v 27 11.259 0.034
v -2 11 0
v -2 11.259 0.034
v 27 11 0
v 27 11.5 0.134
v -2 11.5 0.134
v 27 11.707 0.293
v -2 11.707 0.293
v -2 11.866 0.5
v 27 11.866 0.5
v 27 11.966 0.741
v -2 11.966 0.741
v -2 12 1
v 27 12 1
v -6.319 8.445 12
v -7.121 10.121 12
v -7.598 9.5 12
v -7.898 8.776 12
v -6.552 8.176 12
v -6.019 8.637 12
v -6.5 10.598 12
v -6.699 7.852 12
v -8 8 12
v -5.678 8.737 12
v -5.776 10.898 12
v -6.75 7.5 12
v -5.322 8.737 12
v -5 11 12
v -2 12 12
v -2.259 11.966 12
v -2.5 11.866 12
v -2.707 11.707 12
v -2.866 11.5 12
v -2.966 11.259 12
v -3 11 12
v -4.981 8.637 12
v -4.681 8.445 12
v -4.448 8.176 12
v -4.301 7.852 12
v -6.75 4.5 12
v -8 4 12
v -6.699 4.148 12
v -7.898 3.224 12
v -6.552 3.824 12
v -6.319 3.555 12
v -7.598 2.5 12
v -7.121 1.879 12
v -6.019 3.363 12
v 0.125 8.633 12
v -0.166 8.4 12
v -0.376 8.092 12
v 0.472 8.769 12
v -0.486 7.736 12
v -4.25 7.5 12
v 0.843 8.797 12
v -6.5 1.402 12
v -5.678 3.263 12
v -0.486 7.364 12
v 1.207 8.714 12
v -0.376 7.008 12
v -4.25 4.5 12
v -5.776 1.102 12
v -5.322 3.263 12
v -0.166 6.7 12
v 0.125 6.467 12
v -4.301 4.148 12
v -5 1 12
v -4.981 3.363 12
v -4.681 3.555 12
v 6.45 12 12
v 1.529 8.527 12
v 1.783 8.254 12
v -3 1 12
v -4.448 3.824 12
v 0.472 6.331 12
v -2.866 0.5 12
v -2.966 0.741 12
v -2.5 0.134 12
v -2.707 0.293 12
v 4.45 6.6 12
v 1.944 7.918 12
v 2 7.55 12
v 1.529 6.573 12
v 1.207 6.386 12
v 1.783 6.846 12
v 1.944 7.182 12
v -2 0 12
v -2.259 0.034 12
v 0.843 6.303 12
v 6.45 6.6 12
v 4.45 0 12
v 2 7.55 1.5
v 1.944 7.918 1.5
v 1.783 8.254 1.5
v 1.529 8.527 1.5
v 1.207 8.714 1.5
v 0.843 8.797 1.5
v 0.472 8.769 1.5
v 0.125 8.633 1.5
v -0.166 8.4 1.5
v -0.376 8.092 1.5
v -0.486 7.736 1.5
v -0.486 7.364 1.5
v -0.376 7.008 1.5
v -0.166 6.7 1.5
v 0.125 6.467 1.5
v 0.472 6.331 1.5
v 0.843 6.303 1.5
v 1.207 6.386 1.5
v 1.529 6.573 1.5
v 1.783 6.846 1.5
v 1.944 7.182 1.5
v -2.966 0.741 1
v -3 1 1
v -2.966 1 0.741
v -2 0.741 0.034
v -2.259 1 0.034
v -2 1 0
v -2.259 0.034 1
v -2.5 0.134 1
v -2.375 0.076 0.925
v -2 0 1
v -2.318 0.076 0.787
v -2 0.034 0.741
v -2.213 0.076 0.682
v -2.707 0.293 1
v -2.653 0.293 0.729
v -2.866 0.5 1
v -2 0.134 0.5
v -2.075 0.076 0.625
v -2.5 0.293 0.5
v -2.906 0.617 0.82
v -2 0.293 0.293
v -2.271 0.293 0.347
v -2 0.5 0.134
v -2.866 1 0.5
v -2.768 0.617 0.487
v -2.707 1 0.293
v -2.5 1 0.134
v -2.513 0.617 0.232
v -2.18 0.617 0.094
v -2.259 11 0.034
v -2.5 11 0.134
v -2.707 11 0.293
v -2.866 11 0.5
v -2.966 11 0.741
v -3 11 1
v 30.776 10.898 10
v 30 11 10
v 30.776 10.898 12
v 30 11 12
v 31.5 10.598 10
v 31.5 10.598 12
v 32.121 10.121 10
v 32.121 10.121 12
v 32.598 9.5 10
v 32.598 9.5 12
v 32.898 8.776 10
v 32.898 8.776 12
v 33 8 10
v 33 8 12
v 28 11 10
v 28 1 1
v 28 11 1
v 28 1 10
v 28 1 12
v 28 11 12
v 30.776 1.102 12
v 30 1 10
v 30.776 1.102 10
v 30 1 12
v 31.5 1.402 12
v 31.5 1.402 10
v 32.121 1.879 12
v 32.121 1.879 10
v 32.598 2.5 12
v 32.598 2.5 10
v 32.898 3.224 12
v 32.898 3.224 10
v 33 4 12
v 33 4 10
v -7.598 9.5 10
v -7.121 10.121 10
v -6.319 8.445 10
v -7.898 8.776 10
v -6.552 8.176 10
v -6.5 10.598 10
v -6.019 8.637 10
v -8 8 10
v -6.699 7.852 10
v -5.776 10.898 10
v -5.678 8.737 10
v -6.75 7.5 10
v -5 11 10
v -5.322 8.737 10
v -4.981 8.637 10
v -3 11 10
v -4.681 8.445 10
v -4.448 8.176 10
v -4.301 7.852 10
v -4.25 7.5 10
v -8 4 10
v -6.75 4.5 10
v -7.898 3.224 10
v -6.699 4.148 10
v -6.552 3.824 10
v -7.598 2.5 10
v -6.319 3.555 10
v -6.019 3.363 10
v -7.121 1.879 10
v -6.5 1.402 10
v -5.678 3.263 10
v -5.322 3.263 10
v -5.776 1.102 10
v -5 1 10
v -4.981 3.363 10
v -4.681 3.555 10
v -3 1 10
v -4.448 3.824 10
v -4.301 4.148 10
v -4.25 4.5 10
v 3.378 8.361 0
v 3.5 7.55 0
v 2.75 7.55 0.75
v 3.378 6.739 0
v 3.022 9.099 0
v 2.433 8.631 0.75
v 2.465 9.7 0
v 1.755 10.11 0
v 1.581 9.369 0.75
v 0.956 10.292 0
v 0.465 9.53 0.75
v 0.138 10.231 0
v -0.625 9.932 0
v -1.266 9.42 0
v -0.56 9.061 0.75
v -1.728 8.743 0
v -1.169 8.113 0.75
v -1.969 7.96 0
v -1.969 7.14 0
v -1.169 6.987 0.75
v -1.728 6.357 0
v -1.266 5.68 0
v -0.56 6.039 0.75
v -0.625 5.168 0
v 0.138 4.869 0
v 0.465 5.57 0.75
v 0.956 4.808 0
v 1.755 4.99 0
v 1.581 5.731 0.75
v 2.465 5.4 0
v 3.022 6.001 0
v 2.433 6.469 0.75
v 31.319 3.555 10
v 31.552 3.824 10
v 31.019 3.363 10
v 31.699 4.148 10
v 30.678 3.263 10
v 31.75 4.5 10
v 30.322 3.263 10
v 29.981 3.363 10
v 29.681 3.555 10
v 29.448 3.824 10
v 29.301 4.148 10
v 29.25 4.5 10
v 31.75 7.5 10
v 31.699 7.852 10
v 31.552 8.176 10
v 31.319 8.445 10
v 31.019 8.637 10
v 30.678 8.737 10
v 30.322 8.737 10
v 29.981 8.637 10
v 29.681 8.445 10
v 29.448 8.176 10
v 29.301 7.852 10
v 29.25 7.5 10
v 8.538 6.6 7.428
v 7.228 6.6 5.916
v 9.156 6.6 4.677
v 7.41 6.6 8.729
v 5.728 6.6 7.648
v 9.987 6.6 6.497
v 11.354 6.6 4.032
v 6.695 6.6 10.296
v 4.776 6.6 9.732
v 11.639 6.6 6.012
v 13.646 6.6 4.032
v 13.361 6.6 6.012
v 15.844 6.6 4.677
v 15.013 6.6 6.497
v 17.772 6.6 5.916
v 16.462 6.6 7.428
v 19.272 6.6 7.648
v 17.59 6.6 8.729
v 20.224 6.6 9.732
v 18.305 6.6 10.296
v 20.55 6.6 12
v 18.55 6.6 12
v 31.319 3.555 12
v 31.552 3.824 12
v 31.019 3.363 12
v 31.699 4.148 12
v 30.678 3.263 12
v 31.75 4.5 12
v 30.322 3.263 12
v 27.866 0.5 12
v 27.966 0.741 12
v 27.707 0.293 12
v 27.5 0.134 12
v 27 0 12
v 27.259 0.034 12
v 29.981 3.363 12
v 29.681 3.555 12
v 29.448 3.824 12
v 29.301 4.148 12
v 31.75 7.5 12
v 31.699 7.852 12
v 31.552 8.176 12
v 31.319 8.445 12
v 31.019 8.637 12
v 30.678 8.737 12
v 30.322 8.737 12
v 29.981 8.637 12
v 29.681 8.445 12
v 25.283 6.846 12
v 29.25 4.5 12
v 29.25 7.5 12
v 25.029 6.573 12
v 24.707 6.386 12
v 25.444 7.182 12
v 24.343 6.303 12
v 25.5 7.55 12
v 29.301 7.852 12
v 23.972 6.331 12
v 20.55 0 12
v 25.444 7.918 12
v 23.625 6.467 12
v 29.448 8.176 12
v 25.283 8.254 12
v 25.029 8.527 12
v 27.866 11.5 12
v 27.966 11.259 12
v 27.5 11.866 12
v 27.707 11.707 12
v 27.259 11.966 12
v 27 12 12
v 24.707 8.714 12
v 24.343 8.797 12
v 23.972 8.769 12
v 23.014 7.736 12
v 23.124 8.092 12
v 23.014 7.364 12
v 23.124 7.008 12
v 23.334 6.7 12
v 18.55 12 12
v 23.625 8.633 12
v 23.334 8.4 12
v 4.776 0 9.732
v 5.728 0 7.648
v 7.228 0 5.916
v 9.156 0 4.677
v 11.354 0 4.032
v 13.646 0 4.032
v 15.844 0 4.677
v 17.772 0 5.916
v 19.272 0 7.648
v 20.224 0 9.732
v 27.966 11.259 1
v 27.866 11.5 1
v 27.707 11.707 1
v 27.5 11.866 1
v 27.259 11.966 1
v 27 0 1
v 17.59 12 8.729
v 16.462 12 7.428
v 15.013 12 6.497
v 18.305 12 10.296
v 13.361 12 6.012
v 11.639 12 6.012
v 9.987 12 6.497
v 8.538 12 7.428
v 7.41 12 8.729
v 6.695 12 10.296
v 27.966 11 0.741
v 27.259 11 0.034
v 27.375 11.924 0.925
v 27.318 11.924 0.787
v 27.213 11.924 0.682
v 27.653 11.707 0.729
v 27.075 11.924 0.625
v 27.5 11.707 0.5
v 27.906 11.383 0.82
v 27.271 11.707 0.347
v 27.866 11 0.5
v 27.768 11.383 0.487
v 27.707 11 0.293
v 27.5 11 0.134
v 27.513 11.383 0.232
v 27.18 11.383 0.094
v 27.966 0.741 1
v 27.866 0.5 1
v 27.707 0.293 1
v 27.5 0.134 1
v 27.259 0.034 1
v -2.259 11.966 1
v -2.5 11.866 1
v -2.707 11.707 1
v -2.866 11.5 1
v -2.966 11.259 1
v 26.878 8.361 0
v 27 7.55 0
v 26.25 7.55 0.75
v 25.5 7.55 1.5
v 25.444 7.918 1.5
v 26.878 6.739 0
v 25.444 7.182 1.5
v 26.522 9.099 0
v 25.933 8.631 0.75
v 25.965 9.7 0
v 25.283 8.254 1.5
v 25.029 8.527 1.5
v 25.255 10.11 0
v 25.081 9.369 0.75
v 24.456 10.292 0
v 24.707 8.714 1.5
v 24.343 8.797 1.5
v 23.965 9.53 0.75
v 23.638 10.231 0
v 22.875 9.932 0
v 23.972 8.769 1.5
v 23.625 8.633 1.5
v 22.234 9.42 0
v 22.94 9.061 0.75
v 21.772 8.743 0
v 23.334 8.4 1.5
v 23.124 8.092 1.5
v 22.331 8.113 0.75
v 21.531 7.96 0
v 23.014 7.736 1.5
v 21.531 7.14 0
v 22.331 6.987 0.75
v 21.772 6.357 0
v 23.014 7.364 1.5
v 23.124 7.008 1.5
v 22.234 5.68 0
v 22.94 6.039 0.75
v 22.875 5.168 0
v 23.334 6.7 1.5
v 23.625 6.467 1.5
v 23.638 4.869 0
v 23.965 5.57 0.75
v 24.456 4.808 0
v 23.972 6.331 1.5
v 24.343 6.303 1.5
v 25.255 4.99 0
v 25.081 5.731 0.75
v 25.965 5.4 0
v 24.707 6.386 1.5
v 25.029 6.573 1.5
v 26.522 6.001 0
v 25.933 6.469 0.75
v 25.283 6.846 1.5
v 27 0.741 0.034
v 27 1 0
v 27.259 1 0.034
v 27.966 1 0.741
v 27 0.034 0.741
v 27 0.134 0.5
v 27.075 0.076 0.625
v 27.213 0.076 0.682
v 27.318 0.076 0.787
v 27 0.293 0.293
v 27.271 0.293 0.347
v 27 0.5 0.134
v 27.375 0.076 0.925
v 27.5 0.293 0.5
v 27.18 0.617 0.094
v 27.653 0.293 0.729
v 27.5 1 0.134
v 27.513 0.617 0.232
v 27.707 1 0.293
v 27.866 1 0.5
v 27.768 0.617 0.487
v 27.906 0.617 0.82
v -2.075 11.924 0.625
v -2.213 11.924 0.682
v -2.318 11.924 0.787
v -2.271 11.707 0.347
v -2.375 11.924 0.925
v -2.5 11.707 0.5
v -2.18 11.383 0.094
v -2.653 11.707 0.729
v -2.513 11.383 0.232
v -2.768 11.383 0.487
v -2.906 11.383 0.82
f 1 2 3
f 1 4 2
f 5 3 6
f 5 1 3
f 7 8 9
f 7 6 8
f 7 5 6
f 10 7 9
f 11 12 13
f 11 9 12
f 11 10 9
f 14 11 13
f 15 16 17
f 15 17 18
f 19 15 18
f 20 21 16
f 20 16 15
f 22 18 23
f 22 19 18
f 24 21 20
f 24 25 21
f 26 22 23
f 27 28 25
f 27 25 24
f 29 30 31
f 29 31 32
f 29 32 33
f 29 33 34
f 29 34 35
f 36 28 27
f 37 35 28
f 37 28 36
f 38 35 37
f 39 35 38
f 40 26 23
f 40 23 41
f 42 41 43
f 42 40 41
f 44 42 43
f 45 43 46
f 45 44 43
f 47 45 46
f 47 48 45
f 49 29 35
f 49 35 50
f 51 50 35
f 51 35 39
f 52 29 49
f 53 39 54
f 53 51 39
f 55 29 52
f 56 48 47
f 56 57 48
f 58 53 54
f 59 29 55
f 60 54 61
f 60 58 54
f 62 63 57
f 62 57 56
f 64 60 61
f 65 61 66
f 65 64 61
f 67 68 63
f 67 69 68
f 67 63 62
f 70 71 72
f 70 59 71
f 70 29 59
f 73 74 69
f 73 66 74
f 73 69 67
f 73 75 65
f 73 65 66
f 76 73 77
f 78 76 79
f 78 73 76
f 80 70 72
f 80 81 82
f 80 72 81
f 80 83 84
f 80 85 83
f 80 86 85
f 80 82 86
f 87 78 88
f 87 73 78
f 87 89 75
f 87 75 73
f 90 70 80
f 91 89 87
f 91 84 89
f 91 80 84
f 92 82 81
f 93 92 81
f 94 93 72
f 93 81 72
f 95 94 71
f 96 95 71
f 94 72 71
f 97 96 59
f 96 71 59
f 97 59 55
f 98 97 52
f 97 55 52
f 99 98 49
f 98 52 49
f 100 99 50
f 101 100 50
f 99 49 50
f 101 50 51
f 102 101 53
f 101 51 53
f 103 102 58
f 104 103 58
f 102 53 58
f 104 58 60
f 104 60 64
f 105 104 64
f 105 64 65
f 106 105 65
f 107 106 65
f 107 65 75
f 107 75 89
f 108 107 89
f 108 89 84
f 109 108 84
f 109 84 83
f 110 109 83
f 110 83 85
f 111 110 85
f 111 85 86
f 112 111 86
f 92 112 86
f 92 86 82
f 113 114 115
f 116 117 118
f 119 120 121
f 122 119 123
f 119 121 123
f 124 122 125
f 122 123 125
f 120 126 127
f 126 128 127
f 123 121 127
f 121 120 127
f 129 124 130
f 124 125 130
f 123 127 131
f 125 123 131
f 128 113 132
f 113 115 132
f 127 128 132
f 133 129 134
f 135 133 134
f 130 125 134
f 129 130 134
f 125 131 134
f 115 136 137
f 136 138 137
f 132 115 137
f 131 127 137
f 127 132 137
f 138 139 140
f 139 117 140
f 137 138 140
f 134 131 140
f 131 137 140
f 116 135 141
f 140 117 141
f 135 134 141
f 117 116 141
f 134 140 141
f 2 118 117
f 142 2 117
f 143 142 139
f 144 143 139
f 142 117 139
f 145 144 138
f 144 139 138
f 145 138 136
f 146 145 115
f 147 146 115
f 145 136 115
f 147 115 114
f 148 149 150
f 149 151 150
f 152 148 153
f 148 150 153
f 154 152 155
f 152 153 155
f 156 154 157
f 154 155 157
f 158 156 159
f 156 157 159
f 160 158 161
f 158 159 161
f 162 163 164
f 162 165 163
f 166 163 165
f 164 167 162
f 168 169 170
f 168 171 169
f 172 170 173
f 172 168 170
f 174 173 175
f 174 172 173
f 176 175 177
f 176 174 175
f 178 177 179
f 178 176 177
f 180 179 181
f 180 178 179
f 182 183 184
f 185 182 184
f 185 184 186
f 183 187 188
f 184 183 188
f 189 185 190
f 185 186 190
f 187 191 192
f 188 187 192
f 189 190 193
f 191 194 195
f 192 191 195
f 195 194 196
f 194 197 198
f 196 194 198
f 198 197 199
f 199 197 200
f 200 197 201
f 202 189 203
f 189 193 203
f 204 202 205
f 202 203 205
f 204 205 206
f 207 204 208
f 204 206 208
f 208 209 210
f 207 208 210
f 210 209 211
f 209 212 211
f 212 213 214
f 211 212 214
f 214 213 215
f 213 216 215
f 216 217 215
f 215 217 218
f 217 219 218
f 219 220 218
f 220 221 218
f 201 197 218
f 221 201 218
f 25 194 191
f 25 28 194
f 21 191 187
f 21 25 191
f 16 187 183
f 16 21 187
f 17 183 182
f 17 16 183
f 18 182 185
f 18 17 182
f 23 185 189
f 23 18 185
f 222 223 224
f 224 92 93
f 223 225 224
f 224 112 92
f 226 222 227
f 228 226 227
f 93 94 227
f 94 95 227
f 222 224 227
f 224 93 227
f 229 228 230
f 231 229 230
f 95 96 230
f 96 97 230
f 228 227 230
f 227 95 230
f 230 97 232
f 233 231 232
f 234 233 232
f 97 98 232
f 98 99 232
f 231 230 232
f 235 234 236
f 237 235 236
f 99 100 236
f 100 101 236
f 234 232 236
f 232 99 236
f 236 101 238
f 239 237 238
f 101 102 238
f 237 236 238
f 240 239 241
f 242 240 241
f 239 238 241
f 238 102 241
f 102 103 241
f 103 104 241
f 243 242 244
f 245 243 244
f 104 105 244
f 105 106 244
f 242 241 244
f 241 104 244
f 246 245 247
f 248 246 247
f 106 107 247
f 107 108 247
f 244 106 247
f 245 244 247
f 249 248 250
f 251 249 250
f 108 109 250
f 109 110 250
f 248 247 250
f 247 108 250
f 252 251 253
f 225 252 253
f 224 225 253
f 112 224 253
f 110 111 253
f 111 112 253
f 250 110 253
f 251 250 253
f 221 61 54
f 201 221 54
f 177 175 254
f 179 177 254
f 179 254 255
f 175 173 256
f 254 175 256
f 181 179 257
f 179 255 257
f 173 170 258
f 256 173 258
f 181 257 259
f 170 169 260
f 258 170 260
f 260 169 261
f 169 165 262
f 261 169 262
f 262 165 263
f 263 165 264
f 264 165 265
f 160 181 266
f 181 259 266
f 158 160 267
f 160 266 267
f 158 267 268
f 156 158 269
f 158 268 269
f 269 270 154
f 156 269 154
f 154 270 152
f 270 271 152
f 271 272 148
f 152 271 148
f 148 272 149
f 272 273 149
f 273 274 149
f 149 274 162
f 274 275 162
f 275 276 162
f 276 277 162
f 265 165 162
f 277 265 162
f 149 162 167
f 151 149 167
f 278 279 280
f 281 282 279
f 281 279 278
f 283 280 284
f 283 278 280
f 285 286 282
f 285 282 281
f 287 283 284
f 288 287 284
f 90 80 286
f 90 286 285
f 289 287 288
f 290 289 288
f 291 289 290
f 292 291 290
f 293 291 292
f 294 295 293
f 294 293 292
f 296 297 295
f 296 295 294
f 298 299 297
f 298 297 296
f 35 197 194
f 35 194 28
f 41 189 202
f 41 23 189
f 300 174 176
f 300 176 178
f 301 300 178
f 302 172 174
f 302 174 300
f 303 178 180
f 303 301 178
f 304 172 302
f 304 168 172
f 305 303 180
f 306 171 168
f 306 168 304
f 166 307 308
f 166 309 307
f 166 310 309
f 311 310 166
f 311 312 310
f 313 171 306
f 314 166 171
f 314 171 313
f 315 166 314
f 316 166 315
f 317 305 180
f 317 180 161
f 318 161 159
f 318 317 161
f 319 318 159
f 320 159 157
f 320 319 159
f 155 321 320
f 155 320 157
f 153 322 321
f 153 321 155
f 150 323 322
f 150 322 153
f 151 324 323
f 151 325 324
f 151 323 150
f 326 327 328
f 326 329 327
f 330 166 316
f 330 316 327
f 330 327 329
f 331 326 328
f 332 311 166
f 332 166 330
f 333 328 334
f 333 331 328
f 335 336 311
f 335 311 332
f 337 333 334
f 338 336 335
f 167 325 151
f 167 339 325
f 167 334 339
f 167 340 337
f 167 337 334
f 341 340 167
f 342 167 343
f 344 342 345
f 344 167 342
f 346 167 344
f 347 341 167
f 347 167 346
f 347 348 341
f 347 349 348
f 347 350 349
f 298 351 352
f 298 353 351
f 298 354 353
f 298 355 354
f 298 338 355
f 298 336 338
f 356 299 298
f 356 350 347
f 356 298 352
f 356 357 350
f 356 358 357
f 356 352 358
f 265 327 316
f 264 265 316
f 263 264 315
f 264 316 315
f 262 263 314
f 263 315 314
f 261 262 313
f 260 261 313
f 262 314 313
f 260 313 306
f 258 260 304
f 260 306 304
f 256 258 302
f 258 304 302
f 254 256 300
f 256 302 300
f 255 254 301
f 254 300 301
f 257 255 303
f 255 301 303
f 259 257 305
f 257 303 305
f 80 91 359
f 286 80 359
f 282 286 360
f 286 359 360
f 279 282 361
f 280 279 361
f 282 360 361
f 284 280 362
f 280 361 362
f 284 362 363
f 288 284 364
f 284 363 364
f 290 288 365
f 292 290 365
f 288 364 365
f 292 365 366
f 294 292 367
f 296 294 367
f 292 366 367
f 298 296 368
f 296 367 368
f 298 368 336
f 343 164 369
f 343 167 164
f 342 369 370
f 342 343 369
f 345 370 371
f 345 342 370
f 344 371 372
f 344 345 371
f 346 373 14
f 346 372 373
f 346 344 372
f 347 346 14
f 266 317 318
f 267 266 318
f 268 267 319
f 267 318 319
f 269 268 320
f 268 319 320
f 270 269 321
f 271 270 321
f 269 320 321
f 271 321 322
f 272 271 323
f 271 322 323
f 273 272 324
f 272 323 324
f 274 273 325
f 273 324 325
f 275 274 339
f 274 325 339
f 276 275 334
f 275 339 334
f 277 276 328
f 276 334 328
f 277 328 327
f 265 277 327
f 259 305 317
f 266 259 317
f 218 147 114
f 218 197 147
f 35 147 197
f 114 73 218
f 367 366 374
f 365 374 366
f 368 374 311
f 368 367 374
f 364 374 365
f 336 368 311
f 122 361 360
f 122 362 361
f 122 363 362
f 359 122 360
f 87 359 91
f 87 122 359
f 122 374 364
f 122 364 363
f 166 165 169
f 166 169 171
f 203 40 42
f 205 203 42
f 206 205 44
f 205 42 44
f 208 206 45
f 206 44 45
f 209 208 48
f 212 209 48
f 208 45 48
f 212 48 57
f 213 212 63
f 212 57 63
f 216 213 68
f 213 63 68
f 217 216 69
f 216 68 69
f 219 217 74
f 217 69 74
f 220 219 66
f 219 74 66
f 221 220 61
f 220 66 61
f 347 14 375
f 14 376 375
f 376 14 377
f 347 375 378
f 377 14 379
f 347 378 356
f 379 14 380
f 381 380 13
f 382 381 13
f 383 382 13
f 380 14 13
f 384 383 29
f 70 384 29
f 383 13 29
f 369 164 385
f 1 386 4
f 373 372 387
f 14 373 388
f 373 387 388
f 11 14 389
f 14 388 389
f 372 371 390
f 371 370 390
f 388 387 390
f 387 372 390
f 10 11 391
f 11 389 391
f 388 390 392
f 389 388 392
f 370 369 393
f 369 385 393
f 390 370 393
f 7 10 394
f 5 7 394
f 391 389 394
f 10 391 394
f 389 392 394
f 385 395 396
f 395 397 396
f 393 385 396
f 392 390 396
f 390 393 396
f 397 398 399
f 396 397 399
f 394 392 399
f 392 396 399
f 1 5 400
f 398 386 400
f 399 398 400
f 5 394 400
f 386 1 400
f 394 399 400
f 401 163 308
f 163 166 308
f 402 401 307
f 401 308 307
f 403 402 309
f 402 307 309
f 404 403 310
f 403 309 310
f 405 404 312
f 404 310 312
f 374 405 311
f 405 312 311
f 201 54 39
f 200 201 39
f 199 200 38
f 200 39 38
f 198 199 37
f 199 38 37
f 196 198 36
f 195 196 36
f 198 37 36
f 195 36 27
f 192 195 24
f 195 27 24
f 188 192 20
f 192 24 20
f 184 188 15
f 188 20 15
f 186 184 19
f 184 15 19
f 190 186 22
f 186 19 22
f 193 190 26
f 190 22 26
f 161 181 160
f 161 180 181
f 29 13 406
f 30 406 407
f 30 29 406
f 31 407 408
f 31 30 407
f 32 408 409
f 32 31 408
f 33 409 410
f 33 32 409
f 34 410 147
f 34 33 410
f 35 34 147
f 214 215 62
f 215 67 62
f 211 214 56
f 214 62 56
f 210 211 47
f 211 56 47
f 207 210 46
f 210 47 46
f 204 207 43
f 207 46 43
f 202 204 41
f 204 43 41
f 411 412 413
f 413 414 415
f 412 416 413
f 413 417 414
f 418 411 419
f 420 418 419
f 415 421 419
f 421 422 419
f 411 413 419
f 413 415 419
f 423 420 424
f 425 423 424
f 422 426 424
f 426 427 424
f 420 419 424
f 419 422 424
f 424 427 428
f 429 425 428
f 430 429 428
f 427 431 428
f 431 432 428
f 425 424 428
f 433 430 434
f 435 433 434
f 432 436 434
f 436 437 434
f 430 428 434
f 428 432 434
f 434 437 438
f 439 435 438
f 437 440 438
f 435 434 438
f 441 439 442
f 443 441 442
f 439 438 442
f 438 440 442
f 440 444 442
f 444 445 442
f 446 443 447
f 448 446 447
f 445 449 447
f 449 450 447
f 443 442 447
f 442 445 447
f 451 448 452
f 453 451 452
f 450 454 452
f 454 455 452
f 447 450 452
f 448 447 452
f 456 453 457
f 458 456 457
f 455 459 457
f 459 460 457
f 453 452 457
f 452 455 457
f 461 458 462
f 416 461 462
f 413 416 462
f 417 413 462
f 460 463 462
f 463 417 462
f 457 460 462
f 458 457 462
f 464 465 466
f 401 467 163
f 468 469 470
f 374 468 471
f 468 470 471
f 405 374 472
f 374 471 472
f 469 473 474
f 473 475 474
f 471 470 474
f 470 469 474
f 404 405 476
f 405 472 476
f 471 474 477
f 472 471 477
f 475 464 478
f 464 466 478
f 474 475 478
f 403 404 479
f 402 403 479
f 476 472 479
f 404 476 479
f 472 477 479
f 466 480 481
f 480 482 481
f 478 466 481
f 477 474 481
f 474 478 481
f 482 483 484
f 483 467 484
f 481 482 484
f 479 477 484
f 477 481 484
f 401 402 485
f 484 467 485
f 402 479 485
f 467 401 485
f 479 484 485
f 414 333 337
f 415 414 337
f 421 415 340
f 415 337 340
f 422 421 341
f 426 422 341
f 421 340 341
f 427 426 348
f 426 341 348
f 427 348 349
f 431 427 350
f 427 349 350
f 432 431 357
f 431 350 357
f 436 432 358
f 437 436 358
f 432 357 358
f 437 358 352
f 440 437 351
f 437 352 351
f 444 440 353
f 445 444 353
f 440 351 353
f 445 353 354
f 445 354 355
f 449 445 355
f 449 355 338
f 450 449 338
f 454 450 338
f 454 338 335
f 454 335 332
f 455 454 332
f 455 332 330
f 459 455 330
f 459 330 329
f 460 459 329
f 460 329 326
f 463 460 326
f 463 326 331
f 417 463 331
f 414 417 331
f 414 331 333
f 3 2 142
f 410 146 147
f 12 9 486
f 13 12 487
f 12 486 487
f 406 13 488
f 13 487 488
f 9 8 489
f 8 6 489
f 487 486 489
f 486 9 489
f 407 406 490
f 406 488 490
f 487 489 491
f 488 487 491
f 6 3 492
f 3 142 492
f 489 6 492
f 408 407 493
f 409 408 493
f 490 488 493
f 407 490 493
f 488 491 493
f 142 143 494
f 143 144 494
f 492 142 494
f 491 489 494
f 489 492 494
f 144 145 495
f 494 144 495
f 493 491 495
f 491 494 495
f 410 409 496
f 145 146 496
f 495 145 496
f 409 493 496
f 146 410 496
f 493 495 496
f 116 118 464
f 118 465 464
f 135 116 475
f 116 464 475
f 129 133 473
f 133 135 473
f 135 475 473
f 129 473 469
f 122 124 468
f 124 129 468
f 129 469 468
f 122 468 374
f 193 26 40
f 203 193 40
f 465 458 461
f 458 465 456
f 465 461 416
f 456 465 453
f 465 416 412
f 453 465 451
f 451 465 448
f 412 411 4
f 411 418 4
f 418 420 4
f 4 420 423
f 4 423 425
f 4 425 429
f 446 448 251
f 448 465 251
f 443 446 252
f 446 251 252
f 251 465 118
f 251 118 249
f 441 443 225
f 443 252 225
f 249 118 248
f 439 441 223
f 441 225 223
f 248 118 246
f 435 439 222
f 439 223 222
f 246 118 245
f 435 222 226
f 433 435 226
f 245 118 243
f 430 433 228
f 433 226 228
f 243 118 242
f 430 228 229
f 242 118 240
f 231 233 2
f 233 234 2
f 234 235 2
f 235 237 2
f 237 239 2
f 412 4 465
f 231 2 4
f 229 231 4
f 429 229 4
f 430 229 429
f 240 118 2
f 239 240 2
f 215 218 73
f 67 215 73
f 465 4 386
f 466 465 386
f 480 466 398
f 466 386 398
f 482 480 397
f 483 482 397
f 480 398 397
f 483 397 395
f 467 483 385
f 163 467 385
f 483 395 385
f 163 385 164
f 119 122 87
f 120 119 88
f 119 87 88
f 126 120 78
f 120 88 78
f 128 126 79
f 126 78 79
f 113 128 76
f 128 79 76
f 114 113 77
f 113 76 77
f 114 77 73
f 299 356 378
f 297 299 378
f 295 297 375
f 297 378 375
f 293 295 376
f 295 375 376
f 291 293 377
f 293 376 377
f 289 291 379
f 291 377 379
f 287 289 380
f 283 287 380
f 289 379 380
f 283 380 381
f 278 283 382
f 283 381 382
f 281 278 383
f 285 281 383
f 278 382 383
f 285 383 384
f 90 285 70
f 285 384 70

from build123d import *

# Parameters (mm, degrees)
F0_W      = 25
F0_H      = 12
F1_DEPTH  = 12
F2_R      = 8.05
F3_DEPTH  = 6.6
F4_R      = 6.05
F5_DEPTH  = 5.4
F6_W      = 12
F6_H      = 12
F7_DEPTH  = 3
F8_W      = 12
F8_H      = 12
F9_DEPTH  = 3
F10_R     = 1.25
F11_DEPTH = 25
F12_SIZE  = 1.5
F13_R     = 0.99999
F14_W     = 10
F14_H     = 2
F15_DEPTH = 5
F16_W     = 10
F16_H     = 2
F17_DEPTH = 5
F19_DEPTH = 2
F20_R     = 3


# Not quite as in the source:
# - a fillet or chamfer is up to 0.001 mm smaller than in the source, because OpenCascade refuses the exact size


with BuildPart() as f1:
    # F0 (on Top) → F1 (new body)
    with BuildSketch(Plane.XY):
        with Locations((12.5, 6)):
            Rectangle(F0_W, F0_H)
    extrude(amount=F1_DEPTH)

    # F2 (on face) → F3 (cut)
    with BuildSketch(Plane.XZ):
        with Locations((12.5, 12)):
            Circle(F2_R)
    extrude(amount=-F3_DEPTH, mode=Mode.SUBTRACT)

    # F4 (on face) → F5 (cut)
    with BuildSketch(Plane(origin=(0, 12, 0), x_dir=(-1, 0, 0), z_dir=(0, 1, 0))):
        with Locations((-12.5, 12)):
            Circle(F4_R)
    extrude(amount=-F5_DEPTH, mode=Mode.SUBTRACT)

    # F6 (on face) → F7 (join)
    with BuildSketch(Plane(origin=(0, 0, 0), x_dir=(0, -1, 0), z_dir=(-1, 0, 0))):
        with Locations((-6, 6)):
            Rectangle(F6_W, F6_H)
    extrude(amount=F7_DEPTH)

    # F8 (on face) → F9 (join)
    with BuildSketch(Plane.YZ.offset(25)):
        with Locations((6, 6)):
            Rectangle(F8_W, F8_H)
    extrude(amount=F9_DEPTH)

    # F10 (on face) → F11 (cut)
    with BuildSketch(Plane.XY.offset(12)):
        with Locations((0.75, 7.55)):
            Circle(F10_R)
        with Locations((24.25, 7.55)):
            Circle(F10_R)
    extrude(amount=-F11_DEPTH, mode=Mode.SUBTRACT)

    # F12
    f12_edges = [f1.edges().sort_by_distance(p)[0] for p in [
        (23, 7.55, 0),
        (-0.5, 7.55, 0),
    ]]
    chamfer(f12_edges, length=F12_SIZE)

    # F13 (radius 1 in the source; OpenCascade refuses exactly that, so slightly less here)
    f13_edges = [f1.edges().sort_by_distance(p)[0] for p in [
        (28, 6, 0),
        (-3, 6, 0),
        (28, 12, 6),
        (12.5, 12, 0),
        (-3, 12, 6),
        (-3, 0, 6),
        (12.5, 0, 0),
        (28, 0, 6),
    ]]
    fillet(f13_edges, radius=F13_R)

    # F14 (on face) → F15 (join)
    with BuildSketch(Plane.YZ.offset(28)):
        with Locations((6, 11)):
            Rectangle(F14_W, F14_H)
    extrude(amount=F15_DEPTH)

    # F16 (on face) → F17 (join)
    with BuildSketch(Plane(origin=(-3, 0, 0), x_dir=(0, -1, 0), z_dir=(-1, 0, 0))):
        with Locations((-6, 11)):
            Rectangle(F16_W, F16_H)
    extrude(amount=F17_DEPTH)

    # F18 (on face) → F19 (cut, through all)
    with BuildSketch(Plane.XY.offset(12)):
        with BuildLine():
            ThreePointArc((-4.25, 7.5), (-5.5, 8.75), (-6.75, 7.5))
            Line((-6.75, 7.5), (-6.75, 4.5))
            ThreePointArc((-6.75, 4.5), (-5.5, 3.25), (-4.25, 4.5))
            Line((-4.25, 4.5), (-4.25, 7.5))
        make_face()
        with BuildLine():
            ThreePointArc((31.75, 7.5), (30.5, 8.75), (29.25, 7.5))
            Line((29.25, 7.5), (29.25, 4.5))
            ThreePointArc((29.25, 4.5), (30.5, 3.25), (31.75, 4.5))
            Line((31.75, 4.5), (31.75, 7.5))
        make_face()
    extrude(amount=-F19_DEPTH, mode=Mode.SUBTRACT)

    # F20
    f20_edges = [f1.edges().sort_by_distance(p)[0] for p in [
        (-8, 11, 11),
        (-8, 1, 11),
        (33, 11, 11),
        (33, 1, 11),
    ]]
    fillet(f20_edges, radius=F20_R)


solid = f1.part
